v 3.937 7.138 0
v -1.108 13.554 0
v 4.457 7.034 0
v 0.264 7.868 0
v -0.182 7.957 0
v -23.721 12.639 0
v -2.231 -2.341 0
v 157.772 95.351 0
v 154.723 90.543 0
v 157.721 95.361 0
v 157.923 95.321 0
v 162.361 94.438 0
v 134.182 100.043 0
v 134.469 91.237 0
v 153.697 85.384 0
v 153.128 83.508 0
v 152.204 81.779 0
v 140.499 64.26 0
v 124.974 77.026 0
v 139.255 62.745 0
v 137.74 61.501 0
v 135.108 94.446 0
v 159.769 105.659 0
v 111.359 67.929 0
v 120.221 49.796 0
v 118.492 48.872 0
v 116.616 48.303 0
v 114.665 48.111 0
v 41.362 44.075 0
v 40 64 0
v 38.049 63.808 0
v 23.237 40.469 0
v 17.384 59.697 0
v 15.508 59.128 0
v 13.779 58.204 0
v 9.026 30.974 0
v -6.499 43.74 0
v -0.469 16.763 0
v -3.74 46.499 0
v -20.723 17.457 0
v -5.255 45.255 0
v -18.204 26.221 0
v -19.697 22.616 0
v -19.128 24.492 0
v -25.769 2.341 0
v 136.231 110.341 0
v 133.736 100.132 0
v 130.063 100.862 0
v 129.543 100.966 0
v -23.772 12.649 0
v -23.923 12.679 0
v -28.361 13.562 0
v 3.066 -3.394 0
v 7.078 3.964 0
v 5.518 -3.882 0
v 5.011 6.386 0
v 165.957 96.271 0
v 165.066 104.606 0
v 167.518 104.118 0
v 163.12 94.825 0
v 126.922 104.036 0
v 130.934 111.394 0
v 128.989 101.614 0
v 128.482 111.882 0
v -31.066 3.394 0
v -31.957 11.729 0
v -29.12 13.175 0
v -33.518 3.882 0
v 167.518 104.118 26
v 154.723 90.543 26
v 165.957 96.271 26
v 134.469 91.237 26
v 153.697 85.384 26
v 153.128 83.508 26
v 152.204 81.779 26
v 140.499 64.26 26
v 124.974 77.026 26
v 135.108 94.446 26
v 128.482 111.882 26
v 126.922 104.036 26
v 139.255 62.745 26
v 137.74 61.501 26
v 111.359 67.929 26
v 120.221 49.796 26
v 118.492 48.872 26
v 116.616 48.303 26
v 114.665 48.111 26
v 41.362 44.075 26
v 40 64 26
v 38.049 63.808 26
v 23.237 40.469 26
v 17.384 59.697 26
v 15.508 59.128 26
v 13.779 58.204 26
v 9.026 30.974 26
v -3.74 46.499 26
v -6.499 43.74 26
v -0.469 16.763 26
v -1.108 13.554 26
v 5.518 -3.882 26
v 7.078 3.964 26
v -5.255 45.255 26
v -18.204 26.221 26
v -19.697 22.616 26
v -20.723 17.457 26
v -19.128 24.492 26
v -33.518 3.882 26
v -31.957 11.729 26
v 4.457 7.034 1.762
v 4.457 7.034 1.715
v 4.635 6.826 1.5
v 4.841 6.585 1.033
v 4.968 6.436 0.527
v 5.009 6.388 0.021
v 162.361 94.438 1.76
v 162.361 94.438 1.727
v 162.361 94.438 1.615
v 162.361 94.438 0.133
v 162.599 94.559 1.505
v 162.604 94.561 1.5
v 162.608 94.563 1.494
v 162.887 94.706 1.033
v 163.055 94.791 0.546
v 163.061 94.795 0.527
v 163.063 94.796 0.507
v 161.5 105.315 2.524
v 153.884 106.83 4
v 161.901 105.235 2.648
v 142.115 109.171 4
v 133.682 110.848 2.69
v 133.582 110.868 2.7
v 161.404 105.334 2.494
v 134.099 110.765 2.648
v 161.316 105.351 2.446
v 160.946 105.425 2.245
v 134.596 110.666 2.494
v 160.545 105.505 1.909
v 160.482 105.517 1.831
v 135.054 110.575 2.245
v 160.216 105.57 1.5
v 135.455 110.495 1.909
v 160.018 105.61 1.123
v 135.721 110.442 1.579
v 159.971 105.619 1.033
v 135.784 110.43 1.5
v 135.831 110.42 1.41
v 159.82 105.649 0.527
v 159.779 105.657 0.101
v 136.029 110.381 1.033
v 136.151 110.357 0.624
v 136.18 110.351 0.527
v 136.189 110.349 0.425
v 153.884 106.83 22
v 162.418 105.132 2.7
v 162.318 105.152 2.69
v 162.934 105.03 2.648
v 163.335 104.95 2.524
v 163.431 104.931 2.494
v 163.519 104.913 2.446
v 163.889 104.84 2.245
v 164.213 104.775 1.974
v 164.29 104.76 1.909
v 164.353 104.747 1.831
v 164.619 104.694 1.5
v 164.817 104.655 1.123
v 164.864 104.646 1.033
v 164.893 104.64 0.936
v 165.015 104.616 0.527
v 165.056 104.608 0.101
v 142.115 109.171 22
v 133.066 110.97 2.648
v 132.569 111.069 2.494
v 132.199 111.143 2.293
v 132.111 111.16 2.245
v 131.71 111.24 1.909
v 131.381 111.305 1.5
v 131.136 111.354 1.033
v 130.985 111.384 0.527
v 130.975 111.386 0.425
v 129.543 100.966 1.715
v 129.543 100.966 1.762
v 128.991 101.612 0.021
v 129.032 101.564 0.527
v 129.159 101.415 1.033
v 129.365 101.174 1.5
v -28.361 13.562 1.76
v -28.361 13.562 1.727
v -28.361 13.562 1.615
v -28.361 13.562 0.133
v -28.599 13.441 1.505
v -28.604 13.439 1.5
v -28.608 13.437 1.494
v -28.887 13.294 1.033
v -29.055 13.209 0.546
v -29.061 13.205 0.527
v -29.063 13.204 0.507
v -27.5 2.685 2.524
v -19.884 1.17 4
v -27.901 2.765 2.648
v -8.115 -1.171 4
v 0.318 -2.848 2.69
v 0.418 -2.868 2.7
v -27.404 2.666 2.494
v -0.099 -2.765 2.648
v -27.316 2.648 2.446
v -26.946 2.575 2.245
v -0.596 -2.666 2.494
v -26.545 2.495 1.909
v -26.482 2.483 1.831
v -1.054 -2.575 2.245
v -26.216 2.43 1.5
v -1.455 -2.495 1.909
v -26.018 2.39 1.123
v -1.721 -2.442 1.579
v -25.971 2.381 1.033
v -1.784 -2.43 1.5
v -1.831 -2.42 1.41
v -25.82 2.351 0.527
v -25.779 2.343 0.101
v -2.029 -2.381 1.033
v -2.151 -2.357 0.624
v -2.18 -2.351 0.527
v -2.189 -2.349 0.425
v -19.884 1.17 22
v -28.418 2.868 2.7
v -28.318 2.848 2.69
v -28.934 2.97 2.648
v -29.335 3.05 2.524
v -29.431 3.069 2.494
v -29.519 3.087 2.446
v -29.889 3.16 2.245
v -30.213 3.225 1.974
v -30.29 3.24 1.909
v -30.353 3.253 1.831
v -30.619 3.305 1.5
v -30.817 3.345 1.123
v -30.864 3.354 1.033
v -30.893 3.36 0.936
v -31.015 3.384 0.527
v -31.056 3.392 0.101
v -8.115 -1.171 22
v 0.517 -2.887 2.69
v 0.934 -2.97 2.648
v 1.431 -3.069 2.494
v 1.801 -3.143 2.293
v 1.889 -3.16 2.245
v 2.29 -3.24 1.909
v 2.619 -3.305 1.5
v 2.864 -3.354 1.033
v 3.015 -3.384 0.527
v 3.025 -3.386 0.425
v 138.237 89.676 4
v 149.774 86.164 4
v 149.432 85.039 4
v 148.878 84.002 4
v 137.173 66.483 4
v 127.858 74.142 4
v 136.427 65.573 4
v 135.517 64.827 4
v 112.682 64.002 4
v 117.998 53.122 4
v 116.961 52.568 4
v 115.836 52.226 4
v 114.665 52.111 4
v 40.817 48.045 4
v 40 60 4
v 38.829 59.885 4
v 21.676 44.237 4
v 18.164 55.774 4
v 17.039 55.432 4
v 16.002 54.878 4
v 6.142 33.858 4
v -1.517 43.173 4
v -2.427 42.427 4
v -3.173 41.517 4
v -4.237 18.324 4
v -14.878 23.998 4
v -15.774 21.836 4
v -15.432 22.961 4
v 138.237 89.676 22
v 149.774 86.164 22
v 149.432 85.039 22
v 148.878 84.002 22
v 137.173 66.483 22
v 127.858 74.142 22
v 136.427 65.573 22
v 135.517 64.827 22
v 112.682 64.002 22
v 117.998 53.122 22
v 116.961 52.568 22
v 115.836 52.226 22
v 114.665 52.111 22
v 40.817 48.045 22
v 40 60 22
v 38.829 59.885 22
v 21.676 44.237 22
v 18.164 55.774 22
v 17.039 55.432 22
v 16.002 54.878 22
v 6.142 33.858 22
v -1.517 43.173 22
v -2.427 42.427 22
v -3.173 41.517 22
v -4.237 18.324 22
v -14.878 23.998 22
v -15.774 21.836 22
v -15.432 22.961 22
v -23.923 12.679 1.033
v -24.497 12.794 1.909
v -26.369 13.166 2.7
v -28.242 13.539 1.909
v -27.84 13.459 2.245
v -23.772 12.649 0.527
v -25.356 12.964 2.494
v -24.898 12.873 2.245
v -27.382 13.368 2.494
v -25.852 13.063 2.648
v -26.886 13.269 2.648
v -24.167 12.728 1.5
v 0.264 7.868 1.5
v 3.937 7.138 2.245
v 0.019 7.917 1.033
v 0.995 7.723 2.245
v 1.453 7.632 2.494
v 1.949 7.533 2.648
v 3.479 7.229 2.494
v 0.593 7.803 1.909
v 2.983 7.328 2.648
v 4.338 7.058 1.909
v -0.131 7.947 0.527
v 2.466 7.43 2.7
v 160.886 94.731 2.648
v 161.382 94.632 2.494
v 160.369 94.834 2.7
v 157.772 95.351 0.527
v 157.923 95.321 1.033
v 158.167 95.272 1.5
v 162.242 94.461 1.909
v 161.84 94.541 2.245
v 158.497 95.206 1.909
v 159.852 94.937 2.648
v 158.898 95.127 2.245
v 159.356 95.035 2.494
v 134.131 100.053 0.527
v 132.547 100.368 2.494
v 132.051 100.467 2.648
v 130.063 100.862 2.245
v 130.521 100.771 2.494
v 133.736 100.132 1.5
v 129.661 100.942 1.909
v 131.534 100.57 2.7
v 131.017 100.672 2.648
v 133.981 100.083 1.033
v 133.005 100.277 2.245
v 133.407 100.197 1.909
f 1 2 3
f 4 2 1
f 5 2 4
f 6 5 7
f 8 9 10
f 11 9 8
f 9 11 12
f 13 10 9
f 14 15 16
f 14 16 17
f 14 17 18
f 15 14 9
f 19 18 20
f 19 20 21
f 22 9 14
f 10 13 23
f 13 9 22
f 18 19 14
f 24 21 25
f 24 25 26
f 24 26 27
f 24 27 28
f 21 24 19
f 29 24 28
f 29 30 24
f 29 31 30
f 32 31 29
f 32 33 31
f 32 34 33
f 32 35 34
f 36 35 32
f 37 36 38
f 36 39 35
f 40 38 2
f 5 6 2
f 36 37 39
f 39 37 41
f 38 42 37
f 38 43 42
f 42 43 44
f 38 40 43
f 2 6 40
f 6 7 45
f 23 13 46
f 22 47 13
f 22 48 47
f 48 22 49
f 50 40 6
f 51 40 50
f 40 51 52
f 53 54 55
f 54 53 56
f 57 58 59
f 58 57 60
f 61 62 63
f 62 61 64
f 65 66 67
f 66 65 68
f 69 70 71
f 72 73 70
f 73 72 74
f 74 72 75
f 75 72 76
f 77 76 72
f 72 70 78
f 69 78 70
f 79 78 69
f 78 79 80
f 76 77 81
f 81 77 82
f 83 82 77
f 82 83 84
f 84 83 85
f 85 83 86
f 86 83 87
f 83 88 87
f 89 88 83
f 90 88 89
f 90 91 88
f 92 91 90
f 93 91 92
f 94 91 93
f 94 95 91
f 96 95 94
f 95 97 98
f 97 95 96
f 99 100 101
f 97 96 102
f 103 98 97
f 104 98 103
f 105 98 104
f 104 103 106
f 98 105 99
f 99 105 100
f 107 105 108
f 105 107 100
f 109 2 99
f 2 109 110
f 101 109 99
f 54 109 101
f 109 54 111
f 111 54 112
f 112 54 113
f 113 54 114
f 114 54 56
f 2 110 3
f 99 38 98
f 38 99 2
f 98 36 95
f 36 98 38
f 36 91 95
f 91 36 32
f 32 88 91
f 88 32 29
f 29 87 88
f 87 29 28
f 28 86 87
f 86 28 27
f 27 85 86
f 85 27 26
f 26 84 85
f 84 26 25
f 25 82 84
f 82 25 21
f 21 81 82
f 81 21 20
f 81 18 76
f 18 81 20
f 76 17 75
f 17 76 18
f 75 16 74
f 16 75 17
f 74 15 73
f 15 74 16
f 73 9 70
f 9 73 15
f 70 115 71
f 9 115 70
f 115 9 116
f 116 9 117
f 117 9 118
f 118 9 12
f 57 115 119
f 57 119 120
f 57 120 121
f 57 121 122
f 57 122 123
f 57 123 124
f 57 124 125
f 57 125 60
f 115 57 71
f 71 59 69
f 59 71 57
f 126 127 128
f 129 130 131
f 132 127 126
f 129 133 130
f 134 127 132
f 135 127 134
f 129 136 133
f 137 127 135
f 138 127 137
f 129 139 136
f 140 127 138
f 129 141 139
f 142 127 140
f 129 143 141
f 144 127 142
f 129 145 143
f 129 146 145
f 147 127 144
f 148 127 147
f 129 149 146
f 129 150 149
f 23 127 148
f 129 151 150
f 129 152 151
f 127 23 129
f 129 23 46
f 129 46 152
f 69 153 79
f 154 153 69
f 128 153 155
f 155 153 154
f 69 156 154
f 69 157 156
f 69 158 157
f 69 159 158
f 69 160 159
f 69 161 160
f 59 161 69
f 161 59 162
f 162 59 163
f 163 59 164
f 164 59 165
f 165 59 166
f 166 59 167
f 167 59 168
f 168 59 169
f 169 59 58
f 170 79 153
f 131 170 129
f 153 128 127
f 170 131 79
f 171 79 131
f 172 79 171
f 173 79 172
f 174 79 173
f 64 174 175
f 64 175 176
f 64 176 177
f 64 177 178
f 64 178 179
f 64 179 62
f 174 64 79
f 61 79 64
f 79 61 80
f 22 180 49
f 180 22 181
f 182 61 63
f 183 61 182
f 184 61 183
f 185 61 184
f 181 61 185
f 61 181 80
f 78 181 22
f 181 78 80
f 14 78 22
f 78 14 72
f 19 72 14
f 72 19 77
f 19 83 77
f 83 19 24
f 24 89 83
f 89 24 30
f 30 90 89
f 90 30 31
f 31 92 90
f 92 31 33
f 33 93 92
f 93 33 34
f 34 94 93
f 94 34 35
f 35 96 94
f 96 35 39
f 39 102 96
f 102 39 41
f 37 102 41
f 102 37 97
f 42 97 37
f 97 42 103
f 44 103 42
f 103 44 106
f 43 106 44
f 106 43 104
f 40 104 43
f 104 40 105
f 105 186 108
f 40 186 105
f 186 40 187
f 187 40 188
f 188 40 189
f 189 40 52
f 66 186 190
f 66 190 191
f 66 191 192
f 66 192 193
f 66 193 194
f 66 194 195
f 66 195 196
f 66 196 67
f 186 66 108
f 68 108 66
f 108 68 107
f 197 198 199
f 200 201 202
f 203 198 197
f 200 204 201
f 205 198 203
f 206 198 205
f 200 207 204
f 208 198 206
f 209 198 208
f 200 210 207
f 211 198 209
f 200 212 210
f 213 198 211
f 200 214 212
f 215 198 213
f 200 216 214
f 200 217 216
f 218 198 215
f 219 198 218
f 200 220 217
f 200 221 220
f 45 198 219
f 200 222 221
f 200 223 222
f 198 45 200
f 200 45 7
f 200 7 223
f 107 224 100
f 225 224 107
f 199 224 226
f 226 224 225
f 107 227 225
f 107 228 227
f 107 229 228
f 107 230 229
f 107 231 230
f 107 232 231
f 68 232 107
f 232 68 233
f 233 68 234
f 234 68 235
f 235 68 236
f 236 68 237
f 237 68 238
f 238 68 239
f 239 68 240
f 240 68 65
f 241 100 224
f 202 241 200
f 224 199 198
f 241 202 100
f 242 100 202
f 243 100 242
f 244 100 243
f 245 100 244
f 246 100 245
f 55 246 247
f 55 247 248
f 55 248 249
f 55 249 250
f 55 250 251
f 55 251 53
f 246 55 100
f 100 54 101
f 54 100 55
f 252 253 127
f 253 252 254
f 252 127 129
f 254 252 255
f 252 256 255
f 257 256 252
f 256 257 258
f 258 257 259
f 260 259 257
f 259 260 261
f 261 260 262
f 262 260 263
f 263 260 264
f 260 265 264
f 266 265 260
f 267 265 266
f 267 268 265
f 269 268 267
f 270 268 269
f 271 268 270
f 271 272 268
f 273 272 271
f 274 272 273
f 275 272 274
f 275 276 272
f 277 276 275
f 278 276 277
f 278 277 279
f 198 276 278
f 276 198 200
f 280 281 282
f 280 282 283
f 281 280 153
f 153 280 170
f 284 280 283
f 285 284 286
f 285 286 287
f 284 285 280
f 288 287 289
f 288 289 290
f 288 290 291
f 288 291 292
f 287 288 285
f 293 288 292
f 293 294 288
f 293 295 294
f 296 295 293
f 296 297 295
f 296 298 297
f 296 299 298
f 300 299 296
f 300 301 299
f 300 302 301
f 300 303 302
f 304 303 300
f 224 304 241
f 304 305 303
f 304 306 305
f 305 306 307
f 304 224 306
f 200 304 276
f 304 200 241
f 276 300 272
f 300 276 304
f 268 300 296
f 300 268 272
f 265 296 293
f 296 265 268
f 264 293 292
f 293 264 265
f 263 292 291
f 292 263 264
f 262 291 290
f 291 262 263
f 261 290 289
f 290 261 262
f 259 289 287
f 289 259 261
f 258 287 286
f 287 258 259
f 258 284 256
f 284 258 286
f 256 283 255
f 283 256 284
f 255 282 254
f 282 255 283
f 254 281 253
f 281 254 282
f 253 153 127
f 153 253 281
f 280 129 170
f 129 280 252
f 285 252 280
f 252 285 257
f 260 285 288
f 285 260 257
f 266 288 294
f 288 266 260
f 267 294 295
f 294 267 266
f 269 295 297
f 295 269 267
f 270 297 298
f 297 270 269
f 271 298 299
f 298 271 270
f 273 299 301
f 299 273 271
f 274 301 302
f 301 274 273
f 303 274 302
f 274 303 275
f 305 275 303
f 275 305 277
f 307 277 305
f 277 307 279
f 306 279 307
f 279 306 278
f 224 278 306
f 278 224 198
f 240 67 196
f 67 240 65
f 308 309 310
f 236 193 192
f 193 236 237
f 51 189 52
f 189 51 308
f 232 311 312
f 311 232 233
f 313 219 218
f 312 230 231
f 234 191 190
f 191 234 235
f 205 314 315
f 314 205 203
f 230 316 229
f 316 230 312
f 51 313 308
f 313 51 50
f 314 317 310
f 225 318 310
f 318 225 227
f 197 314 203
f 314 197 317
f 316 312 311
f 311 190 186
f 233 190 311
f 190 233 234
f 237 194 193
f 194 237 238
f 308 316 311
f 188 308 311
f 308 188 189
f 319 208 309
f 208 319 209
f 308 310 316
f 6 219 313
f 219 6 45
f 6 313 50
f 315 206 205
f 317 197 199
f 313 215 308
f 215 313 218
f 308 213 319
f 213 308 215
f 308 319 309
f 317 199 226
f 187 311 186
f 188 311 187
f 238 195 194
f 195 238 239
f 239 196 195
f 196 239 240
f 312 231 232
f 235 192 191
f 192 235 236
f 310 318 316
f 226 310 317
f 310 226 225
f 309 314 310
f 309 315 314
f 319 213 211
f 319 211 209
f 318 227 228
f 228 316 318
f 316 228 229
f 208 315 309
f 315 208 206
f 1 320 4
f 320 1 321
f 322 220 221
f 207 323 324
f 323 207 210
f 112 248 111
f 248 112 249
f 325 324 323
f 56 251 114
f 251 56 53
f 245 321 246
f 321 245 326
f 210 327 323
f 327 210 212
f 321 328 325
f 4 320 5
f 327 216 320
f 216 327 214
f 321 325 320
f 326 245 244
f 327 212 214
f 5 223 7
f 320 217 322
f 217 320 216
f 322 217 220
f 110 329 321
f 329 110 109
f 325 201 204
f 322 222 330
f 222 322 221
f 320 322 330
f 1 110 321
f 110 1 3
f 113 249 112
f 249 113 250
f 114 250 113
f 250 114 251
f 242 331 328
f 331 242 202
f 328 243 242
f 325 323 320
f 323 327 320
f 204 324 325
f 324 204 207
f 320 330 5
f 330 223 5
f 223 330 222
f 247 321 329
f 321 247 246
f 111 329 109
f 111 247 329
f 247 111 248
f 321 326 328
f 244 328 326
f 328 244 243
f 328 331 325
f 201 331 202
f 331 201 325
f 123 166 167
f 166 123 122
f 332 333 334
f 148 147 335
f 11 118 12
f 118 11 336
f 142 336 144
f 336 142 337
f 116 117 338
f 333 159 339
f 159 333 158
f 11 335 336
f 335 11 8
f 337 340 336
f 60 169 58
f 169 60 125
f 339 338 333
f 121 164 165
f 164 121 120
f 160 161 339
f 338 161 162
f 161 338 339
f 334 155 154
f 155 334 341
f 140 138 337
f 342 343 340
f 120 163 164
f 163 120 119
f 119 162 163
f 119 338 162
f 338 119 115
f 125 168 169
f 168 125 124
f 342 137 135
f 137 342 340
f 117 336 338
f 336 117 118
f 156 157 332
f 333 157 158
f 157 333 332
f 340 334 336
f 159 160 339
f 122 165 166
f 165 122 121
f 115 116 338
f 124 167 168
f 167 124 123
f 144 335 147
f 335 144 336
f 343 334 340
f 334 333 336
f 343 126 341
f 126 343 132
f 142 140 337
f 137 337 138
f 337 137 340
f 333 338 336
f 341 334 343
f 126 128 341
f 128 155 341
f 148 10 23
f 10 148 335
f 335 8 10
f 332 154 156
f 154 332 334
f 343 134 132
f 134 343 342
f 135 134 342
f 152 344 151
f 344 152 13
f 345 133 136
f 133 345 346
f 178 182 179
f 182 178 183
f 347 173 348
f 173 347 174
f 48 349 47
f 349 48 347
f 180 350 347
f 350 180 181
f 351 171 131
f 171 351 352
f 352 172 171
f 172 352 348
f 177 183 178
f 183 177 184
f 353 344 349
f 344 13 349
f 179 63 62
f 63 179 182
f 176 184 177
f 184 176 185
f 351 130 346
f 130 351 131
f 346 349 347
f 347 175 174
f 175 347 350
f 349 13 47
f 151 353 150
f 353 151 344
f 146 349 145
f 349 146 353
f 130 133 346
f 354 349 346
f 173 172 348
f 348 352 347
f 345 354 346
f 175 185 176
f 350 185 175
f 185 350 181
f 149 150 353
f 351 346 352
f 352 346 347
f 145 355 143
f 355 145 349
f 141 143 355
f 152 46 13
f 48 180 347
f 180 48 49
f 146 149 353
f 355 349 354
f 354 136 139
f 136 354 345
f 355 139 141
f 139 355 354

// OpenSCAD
$fn = 32;

// ----------------------------------------------------------------------
// Air duct: 20 mm duct, 4 mm wall, 26 mm across
// ----------------------------------------------------------------------

// --- parameters (mm) ---
duct_r = 10;              // duct core radius
duct_d = 20;              // duct core diameter
wall = 4;                 // duct wall thickness
height = 26;              // duct width (extrusion height)
port_r = 19.9;            // port flange half width
port_d = 39.8;            // port flange width
port_t = 8;               // port flange thickness
bolt_d = 5.4;             // port bolt holes
bolt_offset = 14.7;       // bolt hole offset from the port axis

difference() {
  /* outer hull chain: tube with a flat flange plate at every port */
  linear_extrude(height = 26) {
    hull() {
      polygon([[5.518, -3.882], [-33.518, 3.882], [-31.957, 11.729], [7.078, 3.964]]);
      translate([-11.854, 10.789]) circle(r = 10);
    }
    hull() {
      translate([-11.854, 10.789]) circle(r = 10);
      translate([-9.889, 20.665]) circle(r = 10);
    }
    hull() {
      translate([-9.889, 20.665]) circle(r = 10);
      translate([1.816, 38.184]) circle(r = 10);
    }
    hull() {
      translate([1.816, 38.184]) circle(r = 10);
      translate([19.335, 49.889]) circle(r = 10);
    }
    hull() {
      translate([19.335, 49.889]) circle(r = 10);
      translate([40, 54]) circle(r = 10);
    }
    hull() {
      translate([40, 54]) circle(r = 10);
      translate([114.665, 58.111]) circle(r = 10);
    }
    hull() {
      translate([114.665, 58.111]) circle(r = 10);
      translate([132.184, 69.816]) circle(r = 10);
    }
    hull() {
      translate([132.184, 69.816]) circle(r = 10);
      translate([143.889, 87.335]) circle(r = 10);
    }
    hull() {
      translate([143.889, 87.335]) circle(r = 10);
      translate([145.854, 97.211]) circle(r = 10);
    }
    hull() {
      translate([145.854, 97.211]) circle(r = 10);
      polygon([[128.482, 111.882], [167.518, 104.118], [165.957, 96.271], [126.922, 104.036]]);
    }
  }
  /* air passage: the same chain inset by the wall, 5 mm proud of the ports */
  translate([0, 0, 4]) linear_extrude(height = 18) {
    hull() {
      translate([-14.975, -4.904]) circle(r = 6);
      translate([-9.889, 20.665]) circle(r = 6);
    }
    hull() {
      translate([-9.889, 20.665]) circle(r = 6);
      translate([1.816, 38.184]) circle(r = 6);
    }
    hull() {
      translate([1.816, 38.184]) circle(r = 6);
      translate([19.335, 49.889]) circle(r = 6);
    }
    hull() {
      translate([19.335, 49.889]) circle(r = 6);
      translate([40, 54]) circle(r = 6);
    }
    hull() {
      translate([40, 54]) circle(r = 6);
      translate([114.665, 58.111]) circle(r = 6);
    }
    hull() {
      translate([114.665, 58.111]) circle(r = 6);
      translate([132.184, 69.816]) circle(r = 6);
    }
    hull() {
      translate([132.184, 69.816]) circle(r = 6);
      translate([143.889, 87.335]) circle(r = 6);
    }
    hull() {
      translate([143.889, 87.335]) circle(r = 6);
      translate([148.975, 112.904]) circle(r = 6);
    }
  }
  translate([-14, 0]) rotate([0, 0, -11.25]) translate([-14.7, -2.5]) rotate([-90, 0, 0]) cylinder(h = 13, d = 5.4);
  translate([-14, 0]) rotate([0, 0, -11.25]) translate([14.7, -2.5]) rotate([-90, 0, 0]) cylinder(h = 13, d = 5.4);
  translate([148, 108]) rotate([0, 0, 168.75]) translate([-14.7, -2.5]) rotate([-90, 0, 0]) cylinder(h = 13, d = 5.4);
  translate([148, 108]) rotate([0, 0, 168.75]) translate([14.7, -2.5]) rotate([-90, 0, 0]) cylinder(h = 13, d = 5.4);
}
